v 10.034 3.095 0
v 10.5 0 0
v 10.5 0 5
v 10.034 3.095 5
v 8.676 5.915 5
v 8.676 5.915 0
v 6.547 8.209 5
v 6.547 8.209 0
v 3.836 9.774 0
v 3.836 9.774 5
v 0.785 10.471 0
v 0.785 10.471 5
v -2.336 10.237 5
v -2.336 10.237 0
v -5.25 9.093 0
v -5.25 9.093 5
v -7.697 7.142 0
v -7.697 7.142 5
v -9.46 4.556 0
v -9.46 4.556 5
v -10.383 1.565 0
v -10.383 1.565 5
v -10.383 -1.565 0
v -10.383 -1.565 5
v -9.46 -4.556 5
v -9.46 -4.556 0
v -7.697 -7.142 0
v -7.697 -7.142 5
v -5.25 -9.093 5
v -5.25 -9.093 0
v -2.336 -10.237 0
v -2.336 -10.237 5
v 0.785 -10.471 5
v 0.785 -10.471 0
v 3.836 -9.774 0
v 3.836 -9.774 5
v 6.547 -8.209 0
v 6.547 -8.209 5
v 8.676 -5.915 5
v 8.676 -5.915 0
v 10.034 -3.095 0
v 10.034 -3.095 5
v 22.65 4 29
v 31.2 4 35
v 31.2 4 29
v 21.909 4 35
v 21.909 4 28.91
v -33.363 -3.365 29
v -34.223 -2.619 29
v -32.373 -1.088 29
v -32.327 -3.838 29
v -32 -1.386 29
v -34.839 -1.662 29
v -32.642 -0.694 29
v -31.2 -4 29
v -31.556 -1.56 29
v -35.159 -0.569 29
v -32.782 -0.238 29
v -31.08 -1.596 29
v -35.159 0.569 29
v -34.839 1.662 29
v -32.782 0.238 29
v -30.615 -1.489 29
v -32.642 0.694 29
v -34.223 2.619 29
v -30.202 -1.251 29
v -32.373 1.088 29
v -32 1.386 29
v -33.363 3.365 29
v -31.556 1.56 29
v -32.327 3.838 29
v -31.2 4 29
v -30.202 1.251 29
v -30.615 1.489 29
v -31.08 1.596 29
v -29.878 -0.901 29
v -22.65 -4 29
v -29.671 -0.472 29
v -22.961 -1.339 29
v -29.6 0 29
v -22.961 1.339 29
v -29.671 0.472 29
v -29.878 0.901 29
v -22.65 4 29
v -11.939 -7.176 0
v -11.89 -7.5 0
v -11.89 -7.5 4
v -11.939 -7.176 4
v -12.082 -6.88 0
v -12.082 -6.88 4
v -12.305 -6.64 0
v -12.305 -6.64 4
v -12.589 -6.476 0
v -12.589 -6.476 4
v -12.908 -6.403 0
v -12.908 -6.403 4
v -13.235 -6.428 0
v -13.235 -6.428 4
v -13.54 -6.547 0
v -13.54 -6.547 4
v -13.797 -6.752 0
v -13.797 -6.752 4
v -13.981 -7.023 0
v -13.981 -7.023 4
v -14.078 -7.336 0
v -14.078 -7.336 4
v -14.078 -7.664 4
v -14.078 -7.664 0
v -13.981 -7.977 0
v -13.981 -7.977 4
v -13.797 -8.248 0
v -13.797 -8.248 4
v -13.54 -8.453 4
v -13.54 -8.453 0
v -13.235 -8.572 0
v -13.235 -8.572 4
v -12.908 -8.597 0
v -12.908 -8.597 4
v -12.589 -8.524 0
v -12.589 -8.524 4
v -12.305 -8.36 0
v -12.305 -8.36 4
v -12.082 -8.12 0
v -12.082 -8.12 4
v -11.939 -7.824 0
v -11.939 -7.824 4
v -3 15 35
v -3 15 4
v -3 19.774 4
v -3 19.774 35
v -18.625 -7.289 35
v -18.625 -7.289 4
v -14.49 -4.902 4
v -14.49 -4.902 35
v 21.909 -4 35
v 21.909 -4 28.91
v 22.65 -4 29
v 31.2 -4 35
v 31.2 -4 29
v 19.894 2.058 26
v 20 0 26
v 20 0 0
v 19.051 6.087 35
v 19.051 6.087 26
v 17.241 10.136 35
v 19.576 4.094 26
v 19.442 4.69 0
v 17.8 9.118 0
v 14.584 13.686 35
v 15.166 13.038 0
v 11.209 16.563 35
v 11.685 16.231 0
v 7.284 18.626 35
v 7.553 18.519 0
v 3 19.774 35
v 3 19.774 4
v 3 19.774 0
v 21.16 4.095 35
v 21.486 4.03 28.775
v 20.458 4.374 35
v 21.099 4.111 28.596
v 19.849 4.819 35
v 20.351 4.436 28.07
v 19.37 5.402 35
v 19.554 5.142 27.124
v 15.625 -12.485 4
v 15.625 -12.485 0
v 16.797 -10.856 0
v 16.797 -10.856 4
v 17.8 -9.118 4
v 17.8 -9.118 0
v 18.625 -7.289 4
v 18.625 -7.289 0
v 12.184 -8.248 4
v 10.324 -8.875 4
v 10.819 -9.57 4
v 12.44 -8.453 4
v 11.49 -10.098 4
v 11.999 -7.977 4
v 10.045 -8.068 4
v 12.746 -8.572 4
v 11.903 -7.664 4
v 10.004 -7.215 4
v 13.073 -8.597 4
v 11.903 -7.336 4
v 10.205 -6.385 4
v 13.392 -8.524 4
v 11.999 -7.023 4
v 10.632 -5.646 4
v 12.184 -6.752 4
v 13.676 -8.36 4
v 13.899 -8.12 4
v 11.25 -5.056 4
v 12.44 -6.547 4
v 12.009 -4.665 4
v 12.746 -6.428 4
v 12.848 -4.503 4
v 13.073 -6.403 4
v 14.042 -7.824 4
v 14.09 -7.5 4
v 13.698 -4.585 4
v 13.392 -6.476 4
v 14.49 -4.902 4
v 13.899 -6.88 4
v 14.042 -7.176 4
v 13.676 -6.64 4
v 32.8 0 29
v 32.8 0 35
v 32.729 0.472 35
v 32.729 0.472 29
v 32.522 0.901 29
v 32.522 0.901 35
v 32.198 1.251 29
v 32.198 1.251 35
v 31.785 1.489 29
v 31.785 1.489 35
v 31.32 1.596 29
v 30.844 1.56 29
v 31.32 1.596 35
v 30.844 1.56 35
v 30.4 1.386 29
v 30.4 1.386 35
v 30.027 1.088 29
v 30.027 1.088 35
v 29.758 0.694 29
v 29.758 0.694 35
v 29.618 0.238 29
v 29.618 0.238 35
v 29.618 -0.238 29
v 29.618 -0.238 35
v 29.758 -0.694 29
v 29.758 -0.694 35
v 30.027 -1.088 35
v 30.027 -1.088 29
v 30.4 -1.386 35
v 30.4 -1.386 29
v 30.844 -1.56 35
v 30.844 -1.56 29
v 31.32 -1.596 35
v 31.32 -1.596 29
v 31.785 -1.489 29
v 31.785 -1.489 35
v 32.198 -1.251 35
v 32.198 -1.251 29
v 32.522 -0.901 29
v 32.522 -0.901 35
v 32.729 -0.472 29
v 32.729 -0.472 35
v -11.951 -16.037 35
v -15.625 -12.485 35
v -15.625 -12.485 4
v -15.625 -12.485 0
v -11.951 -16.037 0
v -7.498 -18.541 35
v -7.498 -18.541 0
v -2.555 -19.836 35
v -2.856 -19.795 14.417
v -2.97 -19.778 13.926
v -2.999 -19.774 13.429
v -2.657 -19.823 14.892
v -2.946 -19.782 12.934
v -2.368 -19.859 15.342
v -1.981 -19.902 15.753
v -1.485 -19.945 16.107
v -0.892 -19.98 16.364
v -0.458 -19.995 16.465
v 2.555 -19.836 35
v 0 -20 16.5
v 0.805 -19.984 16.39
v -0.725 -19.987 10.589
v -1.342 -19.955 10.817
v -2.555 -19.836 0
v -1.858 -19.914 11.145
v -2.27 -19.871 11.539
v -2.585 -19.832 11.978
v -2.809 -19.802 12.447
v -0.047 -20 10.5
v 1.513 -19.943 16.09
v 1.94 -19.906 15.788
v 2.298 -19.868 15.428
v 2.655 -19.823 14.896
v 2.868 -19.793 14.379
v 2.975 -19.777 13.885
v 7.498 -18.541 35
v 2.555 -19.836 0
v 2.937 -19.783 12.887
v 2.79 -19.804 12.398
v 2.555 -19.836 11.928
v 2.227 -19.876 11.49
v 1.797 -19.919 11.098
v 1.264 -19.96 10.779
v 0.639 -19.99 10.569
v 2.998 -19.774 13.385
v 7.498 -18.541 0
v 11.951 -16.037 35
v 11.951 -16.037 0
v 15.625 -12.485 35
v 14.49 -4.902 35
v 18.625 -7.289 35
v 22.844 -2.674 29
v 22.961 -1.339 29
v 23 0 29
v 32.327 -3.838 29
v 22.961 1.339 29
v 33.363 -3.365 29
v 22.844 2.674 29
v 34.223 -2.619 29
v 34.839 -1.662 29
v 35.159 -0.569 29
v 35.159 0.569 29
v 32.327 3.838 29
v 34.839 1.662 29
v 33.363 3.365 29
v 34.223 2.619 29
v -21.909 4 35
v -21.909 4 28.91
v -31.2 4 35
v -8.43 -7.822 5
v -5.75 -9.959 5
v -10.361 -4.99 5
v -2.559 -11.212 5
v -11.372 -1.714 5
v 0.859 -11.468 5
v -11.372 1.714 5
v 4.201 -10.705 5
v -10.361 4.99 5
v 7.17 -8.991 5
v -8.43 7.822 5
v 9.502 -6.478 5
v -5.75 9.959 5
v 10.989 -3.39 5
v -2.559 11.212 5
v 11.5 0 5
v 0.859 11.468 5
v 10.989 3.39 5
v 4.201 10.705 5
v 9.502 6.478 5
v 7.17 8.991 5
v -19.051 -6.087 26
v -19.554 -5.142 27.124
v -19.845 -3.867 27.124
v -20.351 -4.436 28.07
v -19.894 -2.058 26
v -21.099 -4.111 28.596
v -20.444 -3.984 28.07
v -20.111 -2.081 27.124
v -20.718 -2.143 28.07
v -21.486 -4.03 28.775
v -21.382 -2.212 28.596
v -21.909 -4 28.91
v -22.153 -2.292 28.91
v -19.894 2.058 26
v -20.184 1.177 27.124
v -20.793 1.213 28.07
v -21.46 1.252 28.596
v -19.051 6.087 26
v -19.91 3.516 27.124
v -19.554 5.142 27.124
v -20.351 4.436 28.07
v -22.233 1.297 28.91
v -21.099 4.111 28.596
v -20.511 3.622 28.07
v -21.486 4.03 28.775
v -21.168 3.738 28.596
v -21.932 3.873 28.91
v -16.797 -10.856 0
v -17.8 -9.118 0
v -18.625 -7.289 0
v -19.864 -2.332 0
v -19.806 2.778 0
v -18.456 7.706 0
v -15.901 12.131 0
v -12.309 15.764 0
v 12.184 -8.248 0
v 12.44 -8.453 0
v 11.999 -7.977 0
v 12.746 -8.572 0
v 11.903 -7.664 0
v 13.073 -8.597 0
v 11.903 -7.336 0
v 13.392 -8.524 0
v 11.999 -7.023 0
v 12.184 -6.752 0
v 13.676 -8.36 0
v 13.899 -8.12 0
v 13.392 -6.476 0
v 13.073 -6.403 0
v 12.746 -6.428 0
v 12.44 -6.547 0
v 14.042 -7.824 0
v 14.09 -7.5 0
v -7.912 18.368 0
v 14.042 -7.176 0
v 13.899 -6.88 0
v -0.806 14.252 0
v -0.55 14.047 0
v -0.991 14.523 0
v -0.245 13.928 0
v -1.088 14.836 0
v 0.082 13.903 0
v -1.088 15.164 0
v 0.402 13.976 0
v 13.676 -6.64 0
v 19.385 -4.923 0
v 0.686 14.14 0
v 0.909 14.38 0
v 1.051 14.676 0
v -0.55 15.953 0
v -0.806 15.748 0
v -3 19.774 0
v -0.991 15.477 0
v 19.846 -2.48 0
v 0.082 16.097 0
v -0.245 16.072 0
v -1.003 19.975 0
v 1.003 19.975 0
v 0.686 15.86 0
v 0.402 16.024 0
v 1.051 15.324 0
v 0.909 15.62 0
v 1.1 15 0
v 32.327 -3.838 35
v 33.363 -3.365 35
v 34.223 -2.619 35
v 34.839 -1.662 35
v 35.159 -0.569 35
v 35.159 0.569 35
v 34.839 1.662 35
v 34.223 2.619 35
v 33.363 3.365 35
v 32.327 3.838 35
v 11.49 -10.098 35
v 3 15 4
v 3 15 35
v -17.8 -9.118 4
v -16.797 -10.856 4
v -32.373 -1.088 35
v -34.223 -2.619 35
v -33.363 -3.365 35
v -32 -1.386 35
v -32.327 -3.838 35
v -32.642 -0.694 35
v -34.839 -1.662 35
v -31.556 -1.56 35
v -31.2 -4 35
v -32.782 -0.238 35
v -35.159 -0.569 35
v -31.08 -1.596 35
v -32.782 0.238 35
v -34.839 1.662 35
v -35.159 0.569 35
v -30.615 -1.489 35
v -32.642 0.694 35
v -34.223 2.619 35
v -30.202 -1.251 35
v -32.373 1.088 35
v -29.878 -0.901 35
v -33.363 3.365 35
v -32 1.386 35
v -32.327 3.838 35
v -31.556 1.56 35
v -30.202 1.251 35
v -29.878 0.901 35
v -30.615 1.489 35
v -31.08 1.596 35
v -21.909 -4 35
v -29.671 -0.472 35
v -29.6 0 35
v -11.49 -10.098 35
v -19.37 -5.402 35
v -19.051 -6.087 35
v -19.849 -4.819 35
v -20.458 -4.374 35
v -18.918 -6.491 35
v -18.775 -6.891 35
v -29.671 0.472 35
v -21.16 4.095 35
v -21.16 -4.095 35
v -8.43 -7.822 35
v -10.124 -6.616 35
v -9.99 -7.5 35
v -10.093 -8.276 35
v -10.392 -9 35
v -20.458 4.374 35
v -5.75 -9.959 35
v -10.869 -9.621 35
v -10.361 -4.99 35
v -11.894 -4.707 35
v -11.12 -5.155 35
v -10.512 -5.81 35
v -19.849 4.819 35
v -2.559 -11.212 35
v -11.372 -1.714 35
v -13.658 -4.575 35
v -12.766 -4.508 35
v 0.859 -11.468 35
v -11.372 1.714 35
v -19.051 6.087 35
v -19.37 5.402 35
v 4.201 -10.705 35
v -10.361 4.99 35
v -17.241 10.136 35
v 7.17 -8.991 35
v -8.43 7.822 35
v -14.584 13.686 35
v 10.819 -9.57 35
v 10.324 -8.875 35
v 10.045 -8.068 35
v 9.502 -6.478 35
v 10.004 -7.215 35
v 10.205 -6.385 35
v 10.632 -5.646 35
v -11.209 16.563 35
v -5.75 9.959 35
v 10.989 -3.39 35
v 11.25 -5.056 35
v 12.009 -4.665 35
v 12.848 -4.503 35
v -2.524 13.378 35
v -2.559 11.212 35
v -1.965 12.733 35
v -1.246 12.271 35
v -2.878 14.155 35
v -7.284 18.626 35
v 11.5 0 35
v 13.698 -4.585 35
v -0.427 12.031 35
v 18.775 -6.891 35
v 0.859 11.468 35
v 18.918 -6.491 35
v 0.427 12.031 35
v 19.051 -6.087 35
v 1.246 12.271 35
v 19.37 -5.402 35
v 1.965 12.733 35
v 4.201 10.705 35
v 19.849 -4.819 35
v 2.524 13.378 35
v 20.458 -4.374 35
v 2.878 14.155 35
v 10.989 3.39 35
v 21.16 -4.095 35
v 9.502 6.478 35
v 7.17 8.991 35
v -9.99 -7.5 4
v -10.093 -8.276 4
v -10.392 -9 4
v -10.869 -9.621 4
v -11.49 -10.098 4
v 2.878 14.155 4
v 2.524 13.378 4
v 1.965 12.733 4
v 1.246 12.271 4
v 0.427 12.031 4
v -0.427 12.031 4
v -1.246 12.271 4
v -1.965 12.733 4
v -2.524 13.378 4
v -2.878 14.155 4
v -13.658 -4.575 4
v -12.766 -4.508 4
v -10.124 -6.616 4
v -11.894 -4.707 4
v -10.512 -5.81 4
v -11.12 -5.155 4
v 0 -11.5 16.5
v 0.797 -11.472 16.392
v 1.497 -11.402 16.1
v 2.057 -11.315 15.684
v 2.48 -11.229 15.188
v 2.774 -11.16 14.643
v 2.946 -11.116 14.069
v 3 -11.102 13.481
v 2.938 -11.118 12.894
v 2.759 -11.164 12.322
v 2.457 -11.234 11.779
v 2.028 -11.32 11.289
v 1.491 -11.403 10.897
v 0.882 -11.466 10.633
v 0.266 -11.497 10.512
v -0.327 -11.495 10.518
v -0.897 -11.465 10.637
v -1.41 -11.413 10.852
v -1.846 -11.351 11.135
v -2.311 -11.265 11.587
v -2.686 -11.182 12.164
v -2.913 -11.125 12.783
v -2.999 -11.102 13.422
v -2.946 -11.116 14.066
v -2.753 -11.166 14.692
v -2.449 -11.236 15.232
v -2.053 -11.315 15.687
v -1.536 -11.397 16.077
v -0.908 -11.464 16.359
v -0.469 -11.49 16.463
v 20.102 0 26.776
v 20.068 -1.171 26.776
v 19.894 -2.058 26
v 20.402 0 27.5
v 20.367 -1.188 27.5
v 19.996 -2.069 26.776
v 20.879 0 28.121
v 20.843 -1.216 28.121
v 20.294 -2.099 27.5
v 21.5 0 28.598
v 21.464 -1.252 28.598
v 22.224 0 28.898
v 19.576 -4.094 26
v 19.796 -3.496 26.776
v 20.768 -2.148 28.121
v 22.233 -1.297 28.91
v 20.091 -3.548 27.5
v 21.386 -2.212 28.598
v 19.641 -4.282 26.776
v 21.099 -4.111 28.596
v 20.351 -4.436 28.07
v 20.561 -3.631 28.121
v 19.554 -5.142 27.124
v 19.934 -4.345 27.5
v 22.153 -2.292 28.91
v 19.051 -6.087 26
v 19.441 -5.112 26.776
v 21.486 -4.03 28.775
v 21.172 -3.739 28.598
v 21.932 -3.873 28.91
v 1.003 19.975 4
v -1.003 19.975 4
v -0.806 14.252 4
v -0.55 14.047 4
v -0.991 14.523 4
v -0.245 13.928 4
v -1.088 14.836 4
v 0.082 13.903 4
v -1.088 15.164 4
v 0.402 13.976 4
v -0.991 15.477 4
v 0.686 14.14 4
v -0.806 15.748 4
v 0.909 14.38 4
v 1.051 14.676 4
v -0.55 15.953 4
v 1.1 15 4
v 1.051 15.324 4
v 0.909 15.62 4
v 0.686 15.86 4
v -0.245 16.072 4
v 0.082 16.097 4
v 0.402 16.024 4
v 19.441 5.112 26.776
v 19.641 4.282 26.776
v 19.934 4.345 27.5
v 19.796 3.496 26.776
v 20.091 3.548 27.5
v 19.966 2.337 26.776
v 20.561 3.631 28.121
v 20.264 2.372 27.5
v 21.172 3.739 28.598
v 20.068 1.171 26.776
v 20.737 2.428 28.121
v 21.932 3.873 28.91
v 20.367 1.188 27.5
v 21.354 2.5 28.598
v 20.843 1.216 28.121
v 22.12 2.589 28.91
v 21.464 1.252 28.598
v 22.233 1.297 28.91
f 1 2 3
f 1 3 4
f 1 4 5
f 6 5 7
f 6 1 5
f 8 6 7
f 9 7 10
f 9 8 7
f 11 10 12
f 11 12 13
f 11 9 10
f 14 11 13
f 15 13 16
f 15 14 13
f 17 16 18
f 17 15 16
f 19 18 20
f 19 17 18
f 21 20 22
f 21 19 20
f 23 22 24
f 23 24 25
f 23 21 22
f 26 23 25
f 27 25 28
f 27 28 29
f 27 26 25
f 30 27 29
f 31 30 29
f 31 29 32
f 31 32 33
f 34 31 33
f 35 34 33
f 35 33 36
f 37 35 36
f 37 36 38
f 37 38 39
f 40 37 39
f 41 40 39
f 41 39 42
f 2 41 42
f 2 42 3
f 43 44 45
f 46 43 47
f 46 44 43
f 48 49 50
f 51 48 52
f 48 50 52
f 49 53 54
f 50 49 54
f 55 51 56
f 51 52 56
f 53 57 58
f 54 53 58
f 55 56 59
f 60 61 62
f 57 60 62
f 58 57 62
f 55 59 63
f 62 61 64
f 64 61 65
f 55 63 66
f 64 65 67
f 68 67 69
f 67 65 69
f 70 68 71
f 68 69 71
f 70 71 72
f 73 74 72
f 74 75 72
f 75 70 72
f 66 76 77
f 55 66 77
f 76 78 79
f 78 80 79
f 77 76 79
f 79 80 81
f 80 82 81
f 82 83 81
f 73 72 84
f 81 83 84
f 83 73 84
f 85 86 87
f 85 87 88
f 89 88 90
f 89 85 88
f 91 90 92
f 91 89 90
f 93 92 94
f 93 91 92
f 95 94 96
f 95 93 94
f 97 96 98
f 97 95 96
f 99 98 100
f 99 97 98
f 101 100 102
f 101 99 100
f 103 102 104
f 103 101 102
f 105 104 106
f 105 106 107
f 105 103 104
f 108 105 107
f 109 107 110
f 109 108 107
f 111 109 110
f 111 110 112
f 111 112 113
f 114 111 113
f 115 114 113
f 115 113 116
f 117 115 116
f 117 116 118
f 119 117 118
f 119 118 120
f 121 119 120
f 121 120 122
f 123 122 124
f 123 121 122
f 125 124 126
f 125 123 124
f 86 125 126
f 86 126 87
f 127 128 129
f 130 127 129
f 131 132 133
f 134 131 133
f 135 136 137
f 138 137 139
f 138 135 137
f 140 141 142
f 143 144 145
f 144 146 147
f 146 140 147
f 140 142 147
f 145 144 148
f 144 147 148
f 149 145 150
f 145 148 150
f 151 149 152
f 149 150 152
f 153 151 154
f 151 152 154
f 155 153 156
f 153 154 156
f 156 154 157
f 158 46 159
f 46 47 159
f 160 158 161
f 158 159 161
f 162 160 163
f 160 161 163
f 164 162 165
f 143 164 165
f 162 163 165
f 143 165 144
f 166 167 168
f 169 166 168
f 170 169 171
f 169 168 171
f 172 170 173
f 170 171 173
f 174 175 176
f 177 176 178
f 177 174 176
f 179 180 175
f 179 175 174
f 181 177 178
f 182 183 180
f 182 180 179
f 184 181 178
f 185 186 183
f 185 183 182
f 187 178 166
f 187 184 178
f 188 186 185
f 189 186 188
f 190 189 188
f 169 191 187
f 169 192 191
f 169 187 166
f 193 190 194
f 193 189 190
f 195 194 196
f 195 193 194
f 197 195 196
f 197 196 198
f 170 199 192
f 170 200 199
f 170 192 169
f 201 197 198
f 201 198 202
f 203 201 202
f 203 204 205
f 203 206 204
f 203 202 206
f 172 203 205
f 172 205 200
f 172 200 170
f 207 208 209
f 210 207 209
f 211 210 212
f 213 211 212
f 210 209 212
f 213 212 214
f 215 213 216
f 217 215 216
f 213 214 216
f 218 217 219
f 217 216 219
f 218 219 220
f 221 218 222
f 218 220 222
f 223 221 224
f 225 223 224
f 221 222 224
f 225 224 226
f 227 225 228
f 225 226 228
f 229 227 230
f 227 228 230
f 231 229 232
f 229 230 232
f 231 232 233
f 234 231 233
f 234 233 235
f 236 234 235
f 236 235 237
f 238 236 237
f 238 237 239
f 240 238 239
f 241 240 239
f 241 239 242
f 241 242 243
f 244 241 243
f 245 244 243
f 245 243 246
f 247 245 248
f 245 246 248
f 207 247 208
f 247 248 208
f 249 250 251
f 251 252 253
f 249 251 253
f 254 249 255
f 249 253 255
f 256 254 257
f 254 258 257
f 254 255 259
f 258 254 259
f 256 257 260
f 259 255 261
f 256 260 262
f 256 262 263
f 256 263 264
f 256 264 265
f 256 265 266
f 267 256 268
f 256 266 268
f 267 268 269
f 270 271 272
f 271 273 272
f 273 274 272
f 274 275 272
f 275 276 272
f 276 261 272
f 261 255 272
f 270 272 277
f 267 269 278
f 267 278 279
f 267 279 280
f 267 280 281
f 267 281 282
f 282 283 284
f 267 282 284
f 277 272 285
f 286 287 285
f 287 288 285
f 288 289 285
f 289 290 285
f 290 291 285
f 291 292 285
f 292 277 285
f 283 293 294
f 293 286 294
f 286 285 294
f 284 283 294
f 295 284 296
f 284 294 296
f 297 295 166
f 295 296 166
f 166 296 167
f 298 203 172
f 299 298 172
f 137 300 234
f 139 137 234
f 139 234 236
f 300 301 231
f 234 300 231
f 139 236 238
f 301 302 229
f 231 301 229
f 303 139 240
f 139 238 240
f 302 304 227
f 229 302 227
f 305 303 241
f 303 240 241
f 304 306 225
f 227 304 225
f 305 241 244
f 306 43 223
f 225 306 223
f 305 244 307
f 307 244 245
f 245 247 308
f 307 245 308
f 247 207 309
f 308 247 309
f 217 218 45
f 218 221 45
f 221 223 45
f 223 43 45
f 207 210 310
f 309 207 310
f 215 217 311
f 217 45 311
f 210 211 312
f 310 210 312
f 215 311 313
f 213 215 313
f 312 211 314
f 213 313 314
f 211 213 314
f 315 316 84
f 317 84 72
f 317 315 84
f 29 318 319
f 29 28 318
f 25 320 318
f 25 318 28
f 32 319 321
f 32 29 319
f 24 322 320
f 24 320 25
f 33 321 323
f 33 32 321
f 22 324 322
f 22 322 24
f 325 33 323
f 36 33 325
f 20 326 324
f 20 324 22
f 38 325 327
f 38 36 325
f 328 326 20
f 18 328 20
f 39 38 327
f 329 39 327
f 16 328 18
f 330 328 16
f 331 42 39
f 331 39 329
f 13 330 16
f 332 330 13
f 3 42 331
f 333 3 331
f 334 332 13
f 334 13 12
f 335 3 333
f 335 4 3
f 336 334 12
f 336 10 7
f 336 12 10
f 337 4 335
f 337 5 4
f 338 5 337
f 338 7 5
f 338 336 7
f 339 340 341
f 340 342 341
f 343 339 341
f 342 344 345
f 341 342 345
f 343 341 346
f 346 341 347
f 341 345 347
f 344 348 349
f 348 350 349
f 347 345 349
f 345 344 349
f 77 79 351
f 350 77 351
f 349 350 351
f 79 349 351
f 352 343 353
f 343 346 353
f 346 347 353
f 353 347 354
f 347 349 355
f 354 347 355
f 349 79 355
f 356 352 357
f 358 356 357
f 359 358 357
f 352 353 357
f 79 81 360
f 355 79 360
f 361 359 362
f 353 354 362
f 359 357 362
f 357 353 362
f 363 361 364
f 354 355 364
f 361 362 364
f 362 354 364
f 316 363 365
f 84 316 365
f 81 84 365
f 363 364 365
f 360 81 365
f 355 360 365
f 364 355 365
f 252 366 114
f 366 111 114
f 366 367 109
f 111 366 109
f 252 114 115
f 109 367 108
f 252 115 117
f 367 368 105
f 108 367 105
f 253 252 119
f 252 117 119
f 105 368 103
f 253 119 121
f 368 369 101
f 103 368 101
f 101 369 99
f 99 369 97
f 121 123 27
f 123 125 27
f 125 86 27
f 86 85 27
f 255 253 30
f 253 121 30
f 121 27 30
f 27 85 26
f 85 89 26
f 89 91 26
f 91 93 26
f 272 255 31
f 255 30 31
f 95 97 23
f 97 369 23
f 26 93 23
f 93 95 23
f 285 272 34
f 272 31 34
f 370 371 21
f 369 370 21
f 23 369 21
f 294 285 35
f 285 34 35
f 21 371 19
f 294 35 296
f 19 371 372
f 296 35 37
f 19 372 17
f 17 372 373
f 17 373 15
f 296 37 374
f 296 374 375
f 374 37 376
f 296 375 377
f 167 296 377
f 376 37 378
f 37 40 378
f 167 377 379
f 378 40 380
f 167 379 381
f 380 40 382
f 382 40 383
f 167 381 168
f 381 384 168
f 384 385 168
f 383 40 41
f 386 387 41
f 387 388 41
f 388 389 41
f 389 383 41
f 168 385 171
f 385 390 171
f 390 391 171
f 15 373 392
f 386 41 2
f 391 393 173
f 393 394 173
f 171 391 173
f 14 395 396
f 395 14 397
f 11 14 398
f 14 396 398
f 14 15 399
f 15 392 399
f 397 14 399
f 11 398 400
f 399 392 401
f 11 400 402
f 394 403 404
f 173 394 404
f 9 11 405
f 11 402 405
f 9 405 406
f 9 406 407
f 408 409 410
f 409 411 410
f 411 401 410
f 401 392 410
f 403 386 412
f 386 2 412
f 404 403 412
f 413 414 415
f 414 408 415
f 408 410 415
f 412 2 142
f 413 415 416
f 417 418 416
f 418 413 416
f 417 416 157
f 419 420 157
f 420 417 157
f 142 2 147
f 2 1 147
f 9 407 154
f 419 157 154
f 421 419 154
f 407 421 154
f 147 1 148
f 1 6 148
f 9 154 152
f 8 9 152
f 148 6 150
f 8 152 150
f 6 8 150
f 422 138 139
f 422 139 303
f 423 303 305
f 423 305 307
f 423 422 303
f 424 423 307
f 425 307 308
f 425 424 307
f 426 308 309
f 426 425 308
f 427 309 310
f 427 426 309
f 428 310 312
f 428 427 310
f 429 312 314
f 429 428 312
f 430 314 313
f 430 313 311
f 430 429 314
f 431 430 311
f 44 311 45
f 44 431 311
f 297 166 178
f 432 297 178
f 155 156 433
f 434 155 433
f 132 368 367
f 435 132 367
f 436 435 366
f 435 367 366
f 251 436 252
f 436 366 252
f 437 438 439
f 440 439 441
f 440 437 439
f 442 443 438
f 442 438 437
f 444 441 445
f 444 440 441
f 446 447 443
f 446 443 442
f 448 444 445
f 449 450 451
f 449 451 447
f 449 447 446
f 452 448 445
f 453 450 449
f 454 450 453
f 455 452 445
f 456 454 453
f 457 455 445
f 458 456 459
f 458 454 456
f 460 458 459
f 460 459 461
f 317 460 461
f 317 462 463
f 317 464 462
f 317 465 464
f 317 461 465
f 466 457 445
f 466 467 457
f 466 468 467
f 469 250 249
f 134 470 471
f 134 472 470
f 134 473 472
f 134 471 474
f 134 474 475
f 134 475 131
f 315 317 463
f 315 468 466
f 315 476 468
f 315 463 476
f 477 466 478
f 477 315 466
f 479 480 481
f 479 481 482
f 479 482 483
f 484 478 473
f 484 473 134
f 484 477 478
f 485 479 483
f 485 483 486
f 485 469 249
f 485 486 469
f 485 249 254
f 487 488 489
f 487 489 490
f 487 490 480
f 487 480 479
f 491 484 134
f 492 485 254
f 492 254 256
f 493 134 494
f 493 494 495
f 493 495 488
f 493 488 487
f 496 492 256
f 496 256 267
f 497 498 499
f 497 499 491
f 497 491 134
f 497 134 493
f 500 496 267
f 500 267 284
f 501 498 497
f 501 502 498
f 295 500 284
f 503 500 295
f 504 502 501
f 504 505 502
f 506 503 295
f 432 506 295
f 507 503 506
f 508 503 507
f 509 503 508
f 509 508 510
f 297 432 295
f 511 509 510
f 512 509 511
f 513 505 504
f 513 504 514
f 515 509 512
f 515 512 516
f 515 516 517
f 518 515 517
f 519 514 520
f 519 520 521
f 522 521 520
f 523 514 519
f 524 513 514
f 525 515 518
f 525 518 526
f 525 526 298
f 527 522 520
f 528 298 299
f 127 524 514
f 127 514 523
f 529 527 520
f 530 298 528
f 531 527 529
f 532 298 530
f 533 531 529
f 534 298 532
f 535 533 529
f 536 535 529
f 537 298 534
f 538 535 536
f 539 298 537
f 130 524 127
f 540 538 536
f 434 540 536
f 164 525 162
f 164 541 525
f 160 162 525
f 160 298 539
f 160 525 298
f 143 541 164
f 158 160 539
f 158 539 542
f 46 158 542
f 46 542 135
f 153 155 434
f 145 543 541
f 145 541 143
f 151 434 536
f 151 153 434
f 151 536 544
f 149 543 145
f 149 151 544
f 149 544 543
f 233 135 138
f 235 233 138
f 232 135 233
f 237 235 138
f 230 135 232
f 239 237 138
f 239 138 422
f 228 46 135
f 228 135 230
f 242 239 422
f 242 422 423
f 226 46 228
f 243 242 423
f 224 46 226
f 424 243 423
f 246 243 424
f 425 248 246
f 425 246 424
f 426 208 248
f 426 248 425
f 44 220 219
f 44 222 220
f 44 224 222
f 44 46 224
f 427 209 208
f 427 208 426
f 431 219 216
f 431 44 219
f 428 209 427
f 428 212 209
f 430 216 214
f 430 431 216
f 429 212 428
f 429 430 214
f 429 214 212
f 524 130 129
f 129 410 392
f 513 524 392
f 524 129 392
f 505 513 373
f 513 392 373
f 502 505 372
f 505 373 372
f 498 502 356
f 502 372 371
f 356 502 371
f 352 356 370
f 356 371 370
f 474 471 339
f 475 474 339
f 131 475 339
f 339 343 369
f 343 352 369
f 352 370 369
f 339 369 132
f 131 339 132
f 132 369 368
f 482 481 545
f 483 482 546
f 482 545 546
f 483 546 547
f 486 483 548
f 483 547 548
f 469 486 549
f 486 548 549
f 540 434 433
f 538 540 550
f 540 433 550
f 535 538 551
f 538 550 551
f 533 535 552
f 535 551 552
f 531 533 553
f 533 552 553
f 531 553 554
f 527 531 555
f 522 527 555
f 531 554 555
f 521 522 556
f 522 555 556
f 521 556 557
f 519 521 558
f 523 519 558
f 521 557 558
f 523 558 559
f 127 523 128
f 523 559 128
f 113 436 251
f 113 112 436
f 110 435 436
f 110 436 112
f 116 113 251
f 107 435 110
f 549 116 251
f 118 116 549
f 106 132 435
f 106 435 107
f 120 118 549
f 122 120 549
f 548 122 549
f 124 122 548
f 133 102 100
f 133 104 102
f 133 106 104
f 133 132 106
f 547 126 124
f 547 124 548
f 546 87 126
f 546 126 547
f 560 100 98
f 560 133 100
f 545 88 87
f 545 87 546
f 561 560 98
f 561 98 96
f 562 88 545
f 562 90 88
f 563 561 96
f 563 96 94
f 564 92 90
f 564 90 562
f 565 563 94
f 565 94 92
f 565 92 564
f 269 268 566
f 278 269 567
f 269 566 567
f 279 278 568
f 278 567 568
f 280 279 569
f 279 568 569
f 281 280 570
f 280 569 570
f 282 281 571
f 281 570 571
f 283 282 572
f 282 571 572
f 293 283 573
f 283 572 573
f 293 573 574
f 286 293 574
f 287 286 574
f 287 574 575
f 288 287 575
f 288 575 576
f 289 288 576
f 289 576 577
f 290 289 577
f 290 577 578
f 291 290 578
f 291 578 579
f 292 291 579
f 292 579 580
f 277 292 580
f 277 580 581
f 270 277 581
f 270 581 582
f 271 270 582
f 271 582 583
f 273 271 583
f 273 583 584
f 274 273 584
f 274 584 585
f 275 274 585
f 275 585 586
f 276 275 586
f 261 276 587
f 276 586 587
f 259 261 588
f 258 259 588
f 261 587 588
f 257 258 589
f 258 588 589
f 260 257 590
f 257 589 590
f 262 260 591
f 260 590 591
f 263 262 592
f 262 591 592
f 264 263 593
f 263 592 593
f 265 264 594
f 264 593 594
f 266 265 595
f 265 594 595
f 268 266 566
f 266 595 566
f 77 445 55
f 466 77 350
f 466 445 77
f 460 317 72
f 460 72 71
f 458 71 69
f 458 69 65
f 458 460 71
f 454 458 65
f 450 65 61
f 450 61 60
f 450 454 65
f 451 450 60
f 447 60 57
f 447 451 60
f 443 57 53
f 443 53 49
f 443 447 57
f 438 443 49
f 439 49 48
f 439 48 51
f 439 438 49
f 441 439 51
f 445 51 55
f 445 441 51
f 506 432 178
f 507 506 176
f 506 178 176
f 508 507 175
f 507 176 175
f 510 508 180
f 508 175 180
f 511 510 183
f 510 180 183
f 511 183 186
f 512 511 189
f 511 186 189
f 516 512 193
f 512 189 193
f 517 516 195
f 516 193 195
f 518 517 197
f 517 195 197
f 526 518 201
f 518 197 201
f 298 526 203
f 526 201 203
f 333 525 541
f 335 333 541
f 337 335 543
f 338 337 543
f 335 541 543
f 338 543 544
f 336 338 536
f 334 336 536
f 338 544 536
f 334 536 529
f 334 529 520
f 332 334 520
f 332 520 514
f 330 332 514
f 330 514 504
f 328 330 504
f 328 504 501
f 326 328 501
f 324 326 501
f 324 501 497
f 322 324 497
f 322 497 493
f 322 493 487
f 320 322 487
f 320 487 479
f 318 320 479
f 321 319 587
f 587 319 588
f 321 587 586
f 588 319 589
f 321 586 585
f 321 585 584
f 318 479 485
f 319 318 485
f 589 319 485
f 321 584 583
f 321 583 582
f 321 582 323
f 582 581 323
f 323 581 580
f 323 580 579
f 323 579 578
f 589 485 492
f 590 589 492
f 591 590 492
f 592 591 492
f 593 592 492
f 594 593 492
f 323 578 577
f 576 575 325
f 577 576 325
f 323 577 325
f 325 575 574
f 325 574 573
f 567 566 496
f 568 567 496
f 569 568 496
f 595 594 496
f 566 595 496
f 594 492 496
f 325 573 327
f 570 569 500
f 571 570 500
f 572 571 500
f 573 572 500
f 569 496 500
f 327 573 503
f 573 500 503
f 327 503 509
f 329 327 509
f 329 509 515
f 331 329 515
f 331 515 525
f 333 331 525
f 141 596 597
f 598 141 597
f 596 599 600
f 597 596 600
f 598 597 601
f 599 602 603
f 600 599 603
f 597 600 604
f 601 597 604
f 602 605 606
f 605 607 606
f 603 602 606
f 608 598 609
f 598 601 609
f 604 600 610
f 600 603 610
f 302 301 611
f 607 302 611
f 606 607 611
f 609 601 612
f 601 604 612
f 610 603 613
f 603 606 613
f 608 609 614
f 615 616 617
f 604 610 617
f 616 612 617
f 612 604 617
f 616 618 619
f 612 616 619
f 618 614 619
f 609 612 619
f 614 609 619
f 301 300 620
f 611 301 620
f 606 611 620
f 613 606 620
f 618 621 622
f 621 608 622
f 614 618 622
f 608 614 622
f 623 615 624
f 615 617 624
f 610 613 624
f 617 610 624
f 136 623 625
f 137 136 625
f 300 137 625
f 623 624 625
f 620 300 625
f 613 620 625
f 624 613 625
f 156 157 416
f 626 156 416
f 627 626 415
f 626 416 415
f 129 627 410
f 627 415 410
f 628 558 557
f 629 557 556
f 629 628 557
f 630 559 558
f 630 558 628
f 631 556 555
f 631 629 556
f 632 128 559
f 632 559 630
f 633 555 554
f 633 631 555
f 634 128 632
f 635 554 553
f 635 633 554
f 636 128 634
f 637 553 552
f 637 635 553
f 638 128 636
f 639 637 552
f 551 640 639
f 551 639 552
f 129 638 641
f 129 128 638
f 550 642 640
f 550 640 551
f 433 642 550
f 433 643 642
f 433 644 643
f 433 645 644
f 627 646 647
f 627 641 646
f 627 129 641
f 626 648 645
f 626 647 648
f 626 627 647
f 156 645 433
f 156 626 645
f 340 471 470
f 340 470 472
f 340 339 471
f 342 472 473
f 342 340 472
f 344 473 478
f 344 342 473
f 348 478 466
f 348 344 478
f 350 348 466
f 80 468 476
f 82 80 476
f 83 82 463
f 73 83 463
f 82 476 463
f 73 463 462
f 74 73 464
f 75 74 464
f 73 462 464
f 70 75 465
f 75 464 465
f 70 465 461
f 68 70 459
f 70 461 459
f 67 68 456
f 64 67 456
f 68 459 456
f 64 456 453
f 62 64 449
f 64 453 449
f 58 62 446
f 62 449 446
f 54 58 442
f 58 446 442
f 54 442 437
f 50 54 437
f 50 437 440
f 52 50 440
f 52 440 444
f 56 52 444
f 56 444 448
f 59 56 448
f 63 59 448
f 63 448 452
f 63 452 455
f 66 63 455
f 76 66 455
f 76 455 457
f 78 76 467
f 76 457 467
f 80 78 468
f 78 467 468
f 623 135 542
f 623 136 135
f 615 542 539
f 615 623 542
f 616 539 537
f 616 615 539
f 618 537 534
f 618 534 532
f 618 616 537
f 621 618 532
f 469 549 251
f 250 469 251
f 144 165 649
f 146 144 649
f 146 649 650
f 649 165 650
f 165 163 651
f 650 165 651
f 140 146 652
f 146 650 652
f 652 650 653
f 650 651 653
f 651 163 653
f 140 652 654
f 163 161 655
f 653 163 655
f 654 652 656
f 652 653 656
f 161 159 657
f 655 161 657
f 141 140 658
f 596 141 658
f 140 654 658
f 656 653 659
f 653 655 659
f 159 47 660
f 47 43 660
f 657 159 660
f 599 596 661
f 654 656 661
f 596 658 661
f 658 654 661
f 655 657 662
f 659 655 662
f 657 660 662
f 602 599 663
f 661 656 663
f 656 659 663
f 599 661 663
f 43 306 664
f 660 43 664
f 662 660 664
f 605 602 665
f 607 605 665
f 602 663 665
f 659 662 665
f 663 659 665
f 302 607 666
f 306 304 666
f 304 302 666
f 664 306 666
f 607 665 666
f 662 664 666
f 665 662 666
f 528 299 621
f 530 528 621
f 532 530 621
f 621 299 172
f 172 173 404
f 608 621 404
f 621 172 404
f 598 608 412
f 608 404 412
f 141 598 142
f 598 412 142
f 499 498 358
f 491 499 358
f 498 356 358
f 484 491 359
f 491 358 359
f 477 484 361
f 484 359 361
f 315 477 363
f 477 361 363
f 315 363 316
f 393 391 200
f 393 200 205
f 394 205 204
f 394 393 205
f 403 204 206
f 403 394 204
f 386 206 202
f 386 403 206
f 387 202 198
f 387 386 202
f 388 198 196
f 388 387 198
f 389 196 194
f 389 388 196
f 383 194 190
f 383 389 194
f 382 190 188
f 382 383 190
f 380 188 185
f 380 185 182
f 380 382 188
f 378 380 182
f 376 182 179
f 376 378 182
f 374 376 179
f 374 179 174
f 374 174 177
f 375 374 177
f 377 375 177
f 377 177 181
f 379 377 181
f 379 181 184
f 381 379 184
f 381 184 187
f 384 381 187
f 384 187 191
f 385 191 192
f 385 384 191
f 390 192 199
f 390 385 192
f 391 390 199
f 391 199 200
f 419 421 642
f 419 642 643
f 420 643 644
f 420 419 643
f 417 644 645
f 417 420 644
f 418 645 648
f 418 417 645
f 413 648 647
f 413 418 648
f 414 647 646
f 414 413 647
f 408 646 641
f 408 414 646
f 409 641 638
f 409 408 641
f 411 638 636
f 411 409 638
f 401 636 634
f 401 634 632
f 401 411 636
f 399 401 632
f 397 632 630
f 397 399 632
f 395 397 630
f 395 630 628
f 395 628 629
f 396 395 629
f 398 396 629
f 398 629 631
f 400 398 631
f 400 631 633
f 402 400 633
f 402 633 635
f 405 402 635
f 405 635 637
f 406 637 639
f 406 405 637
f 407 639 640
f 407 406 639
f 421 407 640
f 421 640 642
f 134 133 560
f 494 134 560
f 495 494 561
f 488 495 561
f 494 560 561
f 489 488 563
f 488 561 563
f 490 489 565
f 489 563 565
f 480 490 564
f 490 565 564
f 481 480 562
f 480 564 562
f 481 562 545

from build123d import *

# Parameters (mm, degrees)
SKETCH1_R           = 10.5
BOSS_EXTRUDE1_DEPTH = 35
SKETCH1_3_R         = 1.0999999999987757
SKETCH1_3_R_2       = 1.0999999999999885
SKETCH1_3_R_3       = 1.0999999999996088
BOSS_EXTRUDE2_DEPTH = 4
CUT_EXTRUDE1_START  = -30
SKETCH2_R           = 11.5
SKETCH2_R_2         = 10.5
CUT_EXTRUDE1_DEPTH  = 30
BOSS_EXTRUDE3_START = -6
SKETCH2_3_R         = 1.599999999999998
SKETCH2_3_R_2       = 1.599999999999995
BOSS_EXTRUDE3_DEPTH = 6
FILLET1_R           = 3
SKETCH3_R           = 3.0000000000000004
CUT_EXTRUDE2_DEPTH  = 54.516726422680286


with BuildPart() as part:
    # Sketch1 → Boss-Extrude1 (new body)
    with BuildSketch(Plane.XY):
        with BuildLine():
            ThreePointArc((2.9999999999998876, 15.000000000000563), (1.0993e-12, 12.000000000001776), (-2.9999999999976876, 15.000000000000563))
            Line((-2.9999999999988978, 15.000000000000593), (-2.9999999999988947, 19.77371993328577))
            ThreePointArc((-2.999999999998834, 19.773719933285363), (-17.320508075688434, 10.00000000000059), (-18.62454378954378, -7.288783755289101))
            Line((-18.624543789543775, -7.288783755289104), (-14.490381056766635, -4.901923788646557))
            ThreePointArc((-14.490381056766635, -4.901923788646555), (-11.490381056766648, -4.9019237886465765), (-9.990381056766658, -7.499999999999886))
            ThreePointArc((-9.990381056766658, -7.499999999999887), (-10.39230484541335, -8.9999999999999), (-11.490381056766685, -10.098076211353218))
            Line((-11.490381056766685, -10.098076211353215), (-15.624543789543822, -12.484936177995765))
            ThreePointArc((-15.624543789543823, -12.484936177995765), (-7.473e-14, -20), (15.624543789543718, -12.484936177995895))
            Line((15.624543789544566, -12.484936177996572), (11.490381056767449, -10.098076211353982))
            ThreePointArc((11.490381056767642, -10.098076211353645), (10.392304845414507, -6.000000000000834), (14.490381056767315, -4.9019237886476965))
            Line((14.490381056767498, -4.901923788647381), (18.624543789544614, -7.28878375528997))
            ThreePointArc((18.62454378954359, -7.28878375528958), (19.653127941766318, -3.7087143465848165), (20, -4.9e-15))
            ThreePointArc((20, 0), (15.165750888103432, 13.038404810404913), (3.000000000001001, 19.773719933285037))
            Line((3.000000000001103, 19.773719933285708), (3.0000000000011, 15.000000000000533))
        make_face()
        Circle(SKETCH1_R, mode=Mode.SUBTRACT)
    extrude(amount=BOSS_EXTRUDE1_DEPTH)

    # Sketch1<3> → Boss-Extrude2 (add)
    # profile 1 of 3: a face of its own
    with BuildSketch(Plane.XY):
        with BuildLine():
            Line((-2.9999999999988947, 19.77371993328577), (-2.9999999999988978, 15.000000000000593))
            ThreePointArc((-2.9999999999976876, 15.000000000000563), (1.0993e-12, 12.000000000001776), (2.9999999999998876, 15.000000000000563))
            Line((3.0000000000011, 15.000000000000533), (3.000000000001103, 19.773719933285708))
            ThreePointArc((3.000000000001001, 19.773719933285037), (1.09368e-12, 20), (-2.999999999998834, 19.773719933285363))
        make_face()
        with Locations((1.09985e-12, 15.000000000000563)):
            Circle(SKETCH1_3_R, mode=Mode.SUBTRACT)
    # profile 2 of 3: a face of its own
    with BuildSketch(Plane.XY):
        with BuildLine():
            Line((-14.490381056766635, -4.901923788646557), (-18.624543789543775, -7.288783755289104))
            ThreePointArc((-18.62454378954378, -7.288783755289101), (-17.32050807568887, -9.999999999999833), (-15.624543789543823, -12.484936177995765))
            Line((-15.624543789543822, -12.484936177995765), (-11.490381056766685, -10.098076211353215))
            ThreePointArc((-11.490381056766683, -10.098076211353217), (-10.392304845413328, -5.999999999999909), (-14.490381056766637, -4.901923788646555))
        make_face()
        with Locations((-12.99038105676666, -7.499999999999886)):
            Circle(SKETCH1_3_R_2, mode=Mode.SUBTRACT)
    # profile 3 of 3: a face of its own
    with BuildSketch(Plane.XY):
        with BuildLine():
            ThreePointArc((15.624543789543718, -12.484936177995895), (17.320508075688696, -10.000000000000131), (18.62454378954359, -7.28878375528958))
            Line((18.624543789544614, -7.28878375528997), (14.490381056767498, -4.901923788647381))
            ThreePointArc((14.490381056767315, -4.9019237886476965), (10.392304845414507, -6.000000000000834), (11.490381056767642, -10.098076211353645))
            Line((11.490381056767449, -10.098076211353982), (15.624543789544566, -12.484936177996572))
        make_face()
        with Locations((12.99038105676748, -7.5000000000006715)):
            Circle(SKETCH1_3_R_3, mode=Mode.SUBTRACT)
    extrude(amount=BOSS_EXTRUDE2_DEPTH)

    # Sketch2 → Cut-Extrude1 (cut)
    with BuildSketch(Plane.XY.offset(35).offset(CUT_EXTRUDE1_START)):
        Circle(SKETCH2_R)
        Circle(SKETCH2_R_2, mode=Mode.SUBTRACT)
    extrude(amount=CUT_EXTRUDE1_DEPTH, mode=Mode.SUBTRACT)

    # Sketch2<3> → Boss-Extrude3 (add)
    # profile 1 of 2: a face of its own
    with BuildSketch(Plane.XY.offset(35).offset(BOSS_EXTRUDE3_START)):
        with BuildLine():
            Line((19.59591794226542, -3.9999999999999982), (31.2, -3.9999999999999982))
            ThreePointArc((31.2, -3.999999999999999), (35.199999999999996, -2.4e-16), (31.2, 3.999999999999999))
            Line((31.2, 3.9999999999999982), (19.59591794226542, 3.9999999999999982))
            ThreePointArc((19.595917942265423, 3.999999999999999), (19.999999999999996, -8.9e-16), (19.595917942265427, -3.9999999999999996))
        make_face()
        with Locations((31.2, 0)):
            Circle(SKETCH2_3_R, mode=Mode.SUBTRACT)
    # profile 2 of 2: a face of its own
    with BuildSketch(Plane.XY.offset(35).offset(BOSS_EXTRUDE3_START)):
        with BuildLine():
            ThreePointArc((-19.595917942265448, -3.9999999999998597), (-19.999999999999996, 1.4456e-13), (-19.595917942265395, 4.000000000000134))
            Line((-19.59591794226539, 4.000000000000135), (-31.19999999999997, 4.000000000000216))
            ThreePointArc((-31.19999999999997, 4.000000000000215), (-35.199999999999996, 2.4678e-13), (-31.200000000000028, -3.9999999999997793))
            Line((-31.200000000000028, -3.9999999999997806), (-19.595917942265448, -3.9999999999998614))
        make_face()
        with Locations((-31.2, 2.1787e-13)):
            Circle(SKETCH2_3_R_2, mode=Mode.SUBTRACT)
    extrude(amount=BOSS_EXTRUDE3_DEPTH)

    # Fillet1
    fillet1_edges = [part.edges().sort_by_distance(p)[0] for p in [
        (19.595917942265423, -3.999999999999999, 32),
        (20, 2.2e-16, 29),
        (19.595917942265423, 3.9999999999999987, 32),
        (-19.595917942265395, 4.000000000000135, 32),
        (-19.999999999999996, 1.4011e-13, 29),
        (-19.595917942265448, -3.999999999999861, 32),
    ]]
    fillet(fillet1_edges, radius=FILLET1_R)

    # Sketch3 → Cut-Extrude2 (cut, through all)
    with BuildSketch(Plane(origin=(0, 0, 0), x_dir=(1, 0, 0), z_dir=(0, 1, 0))):
        with Locations((0, -13.499999999999998)):
            Circle(SKETCH3_R)
    extrude(amount=-CUT_EXTRUDE2_DEPTH, mode=Mode.SUBTRACT)


solid = part.part
